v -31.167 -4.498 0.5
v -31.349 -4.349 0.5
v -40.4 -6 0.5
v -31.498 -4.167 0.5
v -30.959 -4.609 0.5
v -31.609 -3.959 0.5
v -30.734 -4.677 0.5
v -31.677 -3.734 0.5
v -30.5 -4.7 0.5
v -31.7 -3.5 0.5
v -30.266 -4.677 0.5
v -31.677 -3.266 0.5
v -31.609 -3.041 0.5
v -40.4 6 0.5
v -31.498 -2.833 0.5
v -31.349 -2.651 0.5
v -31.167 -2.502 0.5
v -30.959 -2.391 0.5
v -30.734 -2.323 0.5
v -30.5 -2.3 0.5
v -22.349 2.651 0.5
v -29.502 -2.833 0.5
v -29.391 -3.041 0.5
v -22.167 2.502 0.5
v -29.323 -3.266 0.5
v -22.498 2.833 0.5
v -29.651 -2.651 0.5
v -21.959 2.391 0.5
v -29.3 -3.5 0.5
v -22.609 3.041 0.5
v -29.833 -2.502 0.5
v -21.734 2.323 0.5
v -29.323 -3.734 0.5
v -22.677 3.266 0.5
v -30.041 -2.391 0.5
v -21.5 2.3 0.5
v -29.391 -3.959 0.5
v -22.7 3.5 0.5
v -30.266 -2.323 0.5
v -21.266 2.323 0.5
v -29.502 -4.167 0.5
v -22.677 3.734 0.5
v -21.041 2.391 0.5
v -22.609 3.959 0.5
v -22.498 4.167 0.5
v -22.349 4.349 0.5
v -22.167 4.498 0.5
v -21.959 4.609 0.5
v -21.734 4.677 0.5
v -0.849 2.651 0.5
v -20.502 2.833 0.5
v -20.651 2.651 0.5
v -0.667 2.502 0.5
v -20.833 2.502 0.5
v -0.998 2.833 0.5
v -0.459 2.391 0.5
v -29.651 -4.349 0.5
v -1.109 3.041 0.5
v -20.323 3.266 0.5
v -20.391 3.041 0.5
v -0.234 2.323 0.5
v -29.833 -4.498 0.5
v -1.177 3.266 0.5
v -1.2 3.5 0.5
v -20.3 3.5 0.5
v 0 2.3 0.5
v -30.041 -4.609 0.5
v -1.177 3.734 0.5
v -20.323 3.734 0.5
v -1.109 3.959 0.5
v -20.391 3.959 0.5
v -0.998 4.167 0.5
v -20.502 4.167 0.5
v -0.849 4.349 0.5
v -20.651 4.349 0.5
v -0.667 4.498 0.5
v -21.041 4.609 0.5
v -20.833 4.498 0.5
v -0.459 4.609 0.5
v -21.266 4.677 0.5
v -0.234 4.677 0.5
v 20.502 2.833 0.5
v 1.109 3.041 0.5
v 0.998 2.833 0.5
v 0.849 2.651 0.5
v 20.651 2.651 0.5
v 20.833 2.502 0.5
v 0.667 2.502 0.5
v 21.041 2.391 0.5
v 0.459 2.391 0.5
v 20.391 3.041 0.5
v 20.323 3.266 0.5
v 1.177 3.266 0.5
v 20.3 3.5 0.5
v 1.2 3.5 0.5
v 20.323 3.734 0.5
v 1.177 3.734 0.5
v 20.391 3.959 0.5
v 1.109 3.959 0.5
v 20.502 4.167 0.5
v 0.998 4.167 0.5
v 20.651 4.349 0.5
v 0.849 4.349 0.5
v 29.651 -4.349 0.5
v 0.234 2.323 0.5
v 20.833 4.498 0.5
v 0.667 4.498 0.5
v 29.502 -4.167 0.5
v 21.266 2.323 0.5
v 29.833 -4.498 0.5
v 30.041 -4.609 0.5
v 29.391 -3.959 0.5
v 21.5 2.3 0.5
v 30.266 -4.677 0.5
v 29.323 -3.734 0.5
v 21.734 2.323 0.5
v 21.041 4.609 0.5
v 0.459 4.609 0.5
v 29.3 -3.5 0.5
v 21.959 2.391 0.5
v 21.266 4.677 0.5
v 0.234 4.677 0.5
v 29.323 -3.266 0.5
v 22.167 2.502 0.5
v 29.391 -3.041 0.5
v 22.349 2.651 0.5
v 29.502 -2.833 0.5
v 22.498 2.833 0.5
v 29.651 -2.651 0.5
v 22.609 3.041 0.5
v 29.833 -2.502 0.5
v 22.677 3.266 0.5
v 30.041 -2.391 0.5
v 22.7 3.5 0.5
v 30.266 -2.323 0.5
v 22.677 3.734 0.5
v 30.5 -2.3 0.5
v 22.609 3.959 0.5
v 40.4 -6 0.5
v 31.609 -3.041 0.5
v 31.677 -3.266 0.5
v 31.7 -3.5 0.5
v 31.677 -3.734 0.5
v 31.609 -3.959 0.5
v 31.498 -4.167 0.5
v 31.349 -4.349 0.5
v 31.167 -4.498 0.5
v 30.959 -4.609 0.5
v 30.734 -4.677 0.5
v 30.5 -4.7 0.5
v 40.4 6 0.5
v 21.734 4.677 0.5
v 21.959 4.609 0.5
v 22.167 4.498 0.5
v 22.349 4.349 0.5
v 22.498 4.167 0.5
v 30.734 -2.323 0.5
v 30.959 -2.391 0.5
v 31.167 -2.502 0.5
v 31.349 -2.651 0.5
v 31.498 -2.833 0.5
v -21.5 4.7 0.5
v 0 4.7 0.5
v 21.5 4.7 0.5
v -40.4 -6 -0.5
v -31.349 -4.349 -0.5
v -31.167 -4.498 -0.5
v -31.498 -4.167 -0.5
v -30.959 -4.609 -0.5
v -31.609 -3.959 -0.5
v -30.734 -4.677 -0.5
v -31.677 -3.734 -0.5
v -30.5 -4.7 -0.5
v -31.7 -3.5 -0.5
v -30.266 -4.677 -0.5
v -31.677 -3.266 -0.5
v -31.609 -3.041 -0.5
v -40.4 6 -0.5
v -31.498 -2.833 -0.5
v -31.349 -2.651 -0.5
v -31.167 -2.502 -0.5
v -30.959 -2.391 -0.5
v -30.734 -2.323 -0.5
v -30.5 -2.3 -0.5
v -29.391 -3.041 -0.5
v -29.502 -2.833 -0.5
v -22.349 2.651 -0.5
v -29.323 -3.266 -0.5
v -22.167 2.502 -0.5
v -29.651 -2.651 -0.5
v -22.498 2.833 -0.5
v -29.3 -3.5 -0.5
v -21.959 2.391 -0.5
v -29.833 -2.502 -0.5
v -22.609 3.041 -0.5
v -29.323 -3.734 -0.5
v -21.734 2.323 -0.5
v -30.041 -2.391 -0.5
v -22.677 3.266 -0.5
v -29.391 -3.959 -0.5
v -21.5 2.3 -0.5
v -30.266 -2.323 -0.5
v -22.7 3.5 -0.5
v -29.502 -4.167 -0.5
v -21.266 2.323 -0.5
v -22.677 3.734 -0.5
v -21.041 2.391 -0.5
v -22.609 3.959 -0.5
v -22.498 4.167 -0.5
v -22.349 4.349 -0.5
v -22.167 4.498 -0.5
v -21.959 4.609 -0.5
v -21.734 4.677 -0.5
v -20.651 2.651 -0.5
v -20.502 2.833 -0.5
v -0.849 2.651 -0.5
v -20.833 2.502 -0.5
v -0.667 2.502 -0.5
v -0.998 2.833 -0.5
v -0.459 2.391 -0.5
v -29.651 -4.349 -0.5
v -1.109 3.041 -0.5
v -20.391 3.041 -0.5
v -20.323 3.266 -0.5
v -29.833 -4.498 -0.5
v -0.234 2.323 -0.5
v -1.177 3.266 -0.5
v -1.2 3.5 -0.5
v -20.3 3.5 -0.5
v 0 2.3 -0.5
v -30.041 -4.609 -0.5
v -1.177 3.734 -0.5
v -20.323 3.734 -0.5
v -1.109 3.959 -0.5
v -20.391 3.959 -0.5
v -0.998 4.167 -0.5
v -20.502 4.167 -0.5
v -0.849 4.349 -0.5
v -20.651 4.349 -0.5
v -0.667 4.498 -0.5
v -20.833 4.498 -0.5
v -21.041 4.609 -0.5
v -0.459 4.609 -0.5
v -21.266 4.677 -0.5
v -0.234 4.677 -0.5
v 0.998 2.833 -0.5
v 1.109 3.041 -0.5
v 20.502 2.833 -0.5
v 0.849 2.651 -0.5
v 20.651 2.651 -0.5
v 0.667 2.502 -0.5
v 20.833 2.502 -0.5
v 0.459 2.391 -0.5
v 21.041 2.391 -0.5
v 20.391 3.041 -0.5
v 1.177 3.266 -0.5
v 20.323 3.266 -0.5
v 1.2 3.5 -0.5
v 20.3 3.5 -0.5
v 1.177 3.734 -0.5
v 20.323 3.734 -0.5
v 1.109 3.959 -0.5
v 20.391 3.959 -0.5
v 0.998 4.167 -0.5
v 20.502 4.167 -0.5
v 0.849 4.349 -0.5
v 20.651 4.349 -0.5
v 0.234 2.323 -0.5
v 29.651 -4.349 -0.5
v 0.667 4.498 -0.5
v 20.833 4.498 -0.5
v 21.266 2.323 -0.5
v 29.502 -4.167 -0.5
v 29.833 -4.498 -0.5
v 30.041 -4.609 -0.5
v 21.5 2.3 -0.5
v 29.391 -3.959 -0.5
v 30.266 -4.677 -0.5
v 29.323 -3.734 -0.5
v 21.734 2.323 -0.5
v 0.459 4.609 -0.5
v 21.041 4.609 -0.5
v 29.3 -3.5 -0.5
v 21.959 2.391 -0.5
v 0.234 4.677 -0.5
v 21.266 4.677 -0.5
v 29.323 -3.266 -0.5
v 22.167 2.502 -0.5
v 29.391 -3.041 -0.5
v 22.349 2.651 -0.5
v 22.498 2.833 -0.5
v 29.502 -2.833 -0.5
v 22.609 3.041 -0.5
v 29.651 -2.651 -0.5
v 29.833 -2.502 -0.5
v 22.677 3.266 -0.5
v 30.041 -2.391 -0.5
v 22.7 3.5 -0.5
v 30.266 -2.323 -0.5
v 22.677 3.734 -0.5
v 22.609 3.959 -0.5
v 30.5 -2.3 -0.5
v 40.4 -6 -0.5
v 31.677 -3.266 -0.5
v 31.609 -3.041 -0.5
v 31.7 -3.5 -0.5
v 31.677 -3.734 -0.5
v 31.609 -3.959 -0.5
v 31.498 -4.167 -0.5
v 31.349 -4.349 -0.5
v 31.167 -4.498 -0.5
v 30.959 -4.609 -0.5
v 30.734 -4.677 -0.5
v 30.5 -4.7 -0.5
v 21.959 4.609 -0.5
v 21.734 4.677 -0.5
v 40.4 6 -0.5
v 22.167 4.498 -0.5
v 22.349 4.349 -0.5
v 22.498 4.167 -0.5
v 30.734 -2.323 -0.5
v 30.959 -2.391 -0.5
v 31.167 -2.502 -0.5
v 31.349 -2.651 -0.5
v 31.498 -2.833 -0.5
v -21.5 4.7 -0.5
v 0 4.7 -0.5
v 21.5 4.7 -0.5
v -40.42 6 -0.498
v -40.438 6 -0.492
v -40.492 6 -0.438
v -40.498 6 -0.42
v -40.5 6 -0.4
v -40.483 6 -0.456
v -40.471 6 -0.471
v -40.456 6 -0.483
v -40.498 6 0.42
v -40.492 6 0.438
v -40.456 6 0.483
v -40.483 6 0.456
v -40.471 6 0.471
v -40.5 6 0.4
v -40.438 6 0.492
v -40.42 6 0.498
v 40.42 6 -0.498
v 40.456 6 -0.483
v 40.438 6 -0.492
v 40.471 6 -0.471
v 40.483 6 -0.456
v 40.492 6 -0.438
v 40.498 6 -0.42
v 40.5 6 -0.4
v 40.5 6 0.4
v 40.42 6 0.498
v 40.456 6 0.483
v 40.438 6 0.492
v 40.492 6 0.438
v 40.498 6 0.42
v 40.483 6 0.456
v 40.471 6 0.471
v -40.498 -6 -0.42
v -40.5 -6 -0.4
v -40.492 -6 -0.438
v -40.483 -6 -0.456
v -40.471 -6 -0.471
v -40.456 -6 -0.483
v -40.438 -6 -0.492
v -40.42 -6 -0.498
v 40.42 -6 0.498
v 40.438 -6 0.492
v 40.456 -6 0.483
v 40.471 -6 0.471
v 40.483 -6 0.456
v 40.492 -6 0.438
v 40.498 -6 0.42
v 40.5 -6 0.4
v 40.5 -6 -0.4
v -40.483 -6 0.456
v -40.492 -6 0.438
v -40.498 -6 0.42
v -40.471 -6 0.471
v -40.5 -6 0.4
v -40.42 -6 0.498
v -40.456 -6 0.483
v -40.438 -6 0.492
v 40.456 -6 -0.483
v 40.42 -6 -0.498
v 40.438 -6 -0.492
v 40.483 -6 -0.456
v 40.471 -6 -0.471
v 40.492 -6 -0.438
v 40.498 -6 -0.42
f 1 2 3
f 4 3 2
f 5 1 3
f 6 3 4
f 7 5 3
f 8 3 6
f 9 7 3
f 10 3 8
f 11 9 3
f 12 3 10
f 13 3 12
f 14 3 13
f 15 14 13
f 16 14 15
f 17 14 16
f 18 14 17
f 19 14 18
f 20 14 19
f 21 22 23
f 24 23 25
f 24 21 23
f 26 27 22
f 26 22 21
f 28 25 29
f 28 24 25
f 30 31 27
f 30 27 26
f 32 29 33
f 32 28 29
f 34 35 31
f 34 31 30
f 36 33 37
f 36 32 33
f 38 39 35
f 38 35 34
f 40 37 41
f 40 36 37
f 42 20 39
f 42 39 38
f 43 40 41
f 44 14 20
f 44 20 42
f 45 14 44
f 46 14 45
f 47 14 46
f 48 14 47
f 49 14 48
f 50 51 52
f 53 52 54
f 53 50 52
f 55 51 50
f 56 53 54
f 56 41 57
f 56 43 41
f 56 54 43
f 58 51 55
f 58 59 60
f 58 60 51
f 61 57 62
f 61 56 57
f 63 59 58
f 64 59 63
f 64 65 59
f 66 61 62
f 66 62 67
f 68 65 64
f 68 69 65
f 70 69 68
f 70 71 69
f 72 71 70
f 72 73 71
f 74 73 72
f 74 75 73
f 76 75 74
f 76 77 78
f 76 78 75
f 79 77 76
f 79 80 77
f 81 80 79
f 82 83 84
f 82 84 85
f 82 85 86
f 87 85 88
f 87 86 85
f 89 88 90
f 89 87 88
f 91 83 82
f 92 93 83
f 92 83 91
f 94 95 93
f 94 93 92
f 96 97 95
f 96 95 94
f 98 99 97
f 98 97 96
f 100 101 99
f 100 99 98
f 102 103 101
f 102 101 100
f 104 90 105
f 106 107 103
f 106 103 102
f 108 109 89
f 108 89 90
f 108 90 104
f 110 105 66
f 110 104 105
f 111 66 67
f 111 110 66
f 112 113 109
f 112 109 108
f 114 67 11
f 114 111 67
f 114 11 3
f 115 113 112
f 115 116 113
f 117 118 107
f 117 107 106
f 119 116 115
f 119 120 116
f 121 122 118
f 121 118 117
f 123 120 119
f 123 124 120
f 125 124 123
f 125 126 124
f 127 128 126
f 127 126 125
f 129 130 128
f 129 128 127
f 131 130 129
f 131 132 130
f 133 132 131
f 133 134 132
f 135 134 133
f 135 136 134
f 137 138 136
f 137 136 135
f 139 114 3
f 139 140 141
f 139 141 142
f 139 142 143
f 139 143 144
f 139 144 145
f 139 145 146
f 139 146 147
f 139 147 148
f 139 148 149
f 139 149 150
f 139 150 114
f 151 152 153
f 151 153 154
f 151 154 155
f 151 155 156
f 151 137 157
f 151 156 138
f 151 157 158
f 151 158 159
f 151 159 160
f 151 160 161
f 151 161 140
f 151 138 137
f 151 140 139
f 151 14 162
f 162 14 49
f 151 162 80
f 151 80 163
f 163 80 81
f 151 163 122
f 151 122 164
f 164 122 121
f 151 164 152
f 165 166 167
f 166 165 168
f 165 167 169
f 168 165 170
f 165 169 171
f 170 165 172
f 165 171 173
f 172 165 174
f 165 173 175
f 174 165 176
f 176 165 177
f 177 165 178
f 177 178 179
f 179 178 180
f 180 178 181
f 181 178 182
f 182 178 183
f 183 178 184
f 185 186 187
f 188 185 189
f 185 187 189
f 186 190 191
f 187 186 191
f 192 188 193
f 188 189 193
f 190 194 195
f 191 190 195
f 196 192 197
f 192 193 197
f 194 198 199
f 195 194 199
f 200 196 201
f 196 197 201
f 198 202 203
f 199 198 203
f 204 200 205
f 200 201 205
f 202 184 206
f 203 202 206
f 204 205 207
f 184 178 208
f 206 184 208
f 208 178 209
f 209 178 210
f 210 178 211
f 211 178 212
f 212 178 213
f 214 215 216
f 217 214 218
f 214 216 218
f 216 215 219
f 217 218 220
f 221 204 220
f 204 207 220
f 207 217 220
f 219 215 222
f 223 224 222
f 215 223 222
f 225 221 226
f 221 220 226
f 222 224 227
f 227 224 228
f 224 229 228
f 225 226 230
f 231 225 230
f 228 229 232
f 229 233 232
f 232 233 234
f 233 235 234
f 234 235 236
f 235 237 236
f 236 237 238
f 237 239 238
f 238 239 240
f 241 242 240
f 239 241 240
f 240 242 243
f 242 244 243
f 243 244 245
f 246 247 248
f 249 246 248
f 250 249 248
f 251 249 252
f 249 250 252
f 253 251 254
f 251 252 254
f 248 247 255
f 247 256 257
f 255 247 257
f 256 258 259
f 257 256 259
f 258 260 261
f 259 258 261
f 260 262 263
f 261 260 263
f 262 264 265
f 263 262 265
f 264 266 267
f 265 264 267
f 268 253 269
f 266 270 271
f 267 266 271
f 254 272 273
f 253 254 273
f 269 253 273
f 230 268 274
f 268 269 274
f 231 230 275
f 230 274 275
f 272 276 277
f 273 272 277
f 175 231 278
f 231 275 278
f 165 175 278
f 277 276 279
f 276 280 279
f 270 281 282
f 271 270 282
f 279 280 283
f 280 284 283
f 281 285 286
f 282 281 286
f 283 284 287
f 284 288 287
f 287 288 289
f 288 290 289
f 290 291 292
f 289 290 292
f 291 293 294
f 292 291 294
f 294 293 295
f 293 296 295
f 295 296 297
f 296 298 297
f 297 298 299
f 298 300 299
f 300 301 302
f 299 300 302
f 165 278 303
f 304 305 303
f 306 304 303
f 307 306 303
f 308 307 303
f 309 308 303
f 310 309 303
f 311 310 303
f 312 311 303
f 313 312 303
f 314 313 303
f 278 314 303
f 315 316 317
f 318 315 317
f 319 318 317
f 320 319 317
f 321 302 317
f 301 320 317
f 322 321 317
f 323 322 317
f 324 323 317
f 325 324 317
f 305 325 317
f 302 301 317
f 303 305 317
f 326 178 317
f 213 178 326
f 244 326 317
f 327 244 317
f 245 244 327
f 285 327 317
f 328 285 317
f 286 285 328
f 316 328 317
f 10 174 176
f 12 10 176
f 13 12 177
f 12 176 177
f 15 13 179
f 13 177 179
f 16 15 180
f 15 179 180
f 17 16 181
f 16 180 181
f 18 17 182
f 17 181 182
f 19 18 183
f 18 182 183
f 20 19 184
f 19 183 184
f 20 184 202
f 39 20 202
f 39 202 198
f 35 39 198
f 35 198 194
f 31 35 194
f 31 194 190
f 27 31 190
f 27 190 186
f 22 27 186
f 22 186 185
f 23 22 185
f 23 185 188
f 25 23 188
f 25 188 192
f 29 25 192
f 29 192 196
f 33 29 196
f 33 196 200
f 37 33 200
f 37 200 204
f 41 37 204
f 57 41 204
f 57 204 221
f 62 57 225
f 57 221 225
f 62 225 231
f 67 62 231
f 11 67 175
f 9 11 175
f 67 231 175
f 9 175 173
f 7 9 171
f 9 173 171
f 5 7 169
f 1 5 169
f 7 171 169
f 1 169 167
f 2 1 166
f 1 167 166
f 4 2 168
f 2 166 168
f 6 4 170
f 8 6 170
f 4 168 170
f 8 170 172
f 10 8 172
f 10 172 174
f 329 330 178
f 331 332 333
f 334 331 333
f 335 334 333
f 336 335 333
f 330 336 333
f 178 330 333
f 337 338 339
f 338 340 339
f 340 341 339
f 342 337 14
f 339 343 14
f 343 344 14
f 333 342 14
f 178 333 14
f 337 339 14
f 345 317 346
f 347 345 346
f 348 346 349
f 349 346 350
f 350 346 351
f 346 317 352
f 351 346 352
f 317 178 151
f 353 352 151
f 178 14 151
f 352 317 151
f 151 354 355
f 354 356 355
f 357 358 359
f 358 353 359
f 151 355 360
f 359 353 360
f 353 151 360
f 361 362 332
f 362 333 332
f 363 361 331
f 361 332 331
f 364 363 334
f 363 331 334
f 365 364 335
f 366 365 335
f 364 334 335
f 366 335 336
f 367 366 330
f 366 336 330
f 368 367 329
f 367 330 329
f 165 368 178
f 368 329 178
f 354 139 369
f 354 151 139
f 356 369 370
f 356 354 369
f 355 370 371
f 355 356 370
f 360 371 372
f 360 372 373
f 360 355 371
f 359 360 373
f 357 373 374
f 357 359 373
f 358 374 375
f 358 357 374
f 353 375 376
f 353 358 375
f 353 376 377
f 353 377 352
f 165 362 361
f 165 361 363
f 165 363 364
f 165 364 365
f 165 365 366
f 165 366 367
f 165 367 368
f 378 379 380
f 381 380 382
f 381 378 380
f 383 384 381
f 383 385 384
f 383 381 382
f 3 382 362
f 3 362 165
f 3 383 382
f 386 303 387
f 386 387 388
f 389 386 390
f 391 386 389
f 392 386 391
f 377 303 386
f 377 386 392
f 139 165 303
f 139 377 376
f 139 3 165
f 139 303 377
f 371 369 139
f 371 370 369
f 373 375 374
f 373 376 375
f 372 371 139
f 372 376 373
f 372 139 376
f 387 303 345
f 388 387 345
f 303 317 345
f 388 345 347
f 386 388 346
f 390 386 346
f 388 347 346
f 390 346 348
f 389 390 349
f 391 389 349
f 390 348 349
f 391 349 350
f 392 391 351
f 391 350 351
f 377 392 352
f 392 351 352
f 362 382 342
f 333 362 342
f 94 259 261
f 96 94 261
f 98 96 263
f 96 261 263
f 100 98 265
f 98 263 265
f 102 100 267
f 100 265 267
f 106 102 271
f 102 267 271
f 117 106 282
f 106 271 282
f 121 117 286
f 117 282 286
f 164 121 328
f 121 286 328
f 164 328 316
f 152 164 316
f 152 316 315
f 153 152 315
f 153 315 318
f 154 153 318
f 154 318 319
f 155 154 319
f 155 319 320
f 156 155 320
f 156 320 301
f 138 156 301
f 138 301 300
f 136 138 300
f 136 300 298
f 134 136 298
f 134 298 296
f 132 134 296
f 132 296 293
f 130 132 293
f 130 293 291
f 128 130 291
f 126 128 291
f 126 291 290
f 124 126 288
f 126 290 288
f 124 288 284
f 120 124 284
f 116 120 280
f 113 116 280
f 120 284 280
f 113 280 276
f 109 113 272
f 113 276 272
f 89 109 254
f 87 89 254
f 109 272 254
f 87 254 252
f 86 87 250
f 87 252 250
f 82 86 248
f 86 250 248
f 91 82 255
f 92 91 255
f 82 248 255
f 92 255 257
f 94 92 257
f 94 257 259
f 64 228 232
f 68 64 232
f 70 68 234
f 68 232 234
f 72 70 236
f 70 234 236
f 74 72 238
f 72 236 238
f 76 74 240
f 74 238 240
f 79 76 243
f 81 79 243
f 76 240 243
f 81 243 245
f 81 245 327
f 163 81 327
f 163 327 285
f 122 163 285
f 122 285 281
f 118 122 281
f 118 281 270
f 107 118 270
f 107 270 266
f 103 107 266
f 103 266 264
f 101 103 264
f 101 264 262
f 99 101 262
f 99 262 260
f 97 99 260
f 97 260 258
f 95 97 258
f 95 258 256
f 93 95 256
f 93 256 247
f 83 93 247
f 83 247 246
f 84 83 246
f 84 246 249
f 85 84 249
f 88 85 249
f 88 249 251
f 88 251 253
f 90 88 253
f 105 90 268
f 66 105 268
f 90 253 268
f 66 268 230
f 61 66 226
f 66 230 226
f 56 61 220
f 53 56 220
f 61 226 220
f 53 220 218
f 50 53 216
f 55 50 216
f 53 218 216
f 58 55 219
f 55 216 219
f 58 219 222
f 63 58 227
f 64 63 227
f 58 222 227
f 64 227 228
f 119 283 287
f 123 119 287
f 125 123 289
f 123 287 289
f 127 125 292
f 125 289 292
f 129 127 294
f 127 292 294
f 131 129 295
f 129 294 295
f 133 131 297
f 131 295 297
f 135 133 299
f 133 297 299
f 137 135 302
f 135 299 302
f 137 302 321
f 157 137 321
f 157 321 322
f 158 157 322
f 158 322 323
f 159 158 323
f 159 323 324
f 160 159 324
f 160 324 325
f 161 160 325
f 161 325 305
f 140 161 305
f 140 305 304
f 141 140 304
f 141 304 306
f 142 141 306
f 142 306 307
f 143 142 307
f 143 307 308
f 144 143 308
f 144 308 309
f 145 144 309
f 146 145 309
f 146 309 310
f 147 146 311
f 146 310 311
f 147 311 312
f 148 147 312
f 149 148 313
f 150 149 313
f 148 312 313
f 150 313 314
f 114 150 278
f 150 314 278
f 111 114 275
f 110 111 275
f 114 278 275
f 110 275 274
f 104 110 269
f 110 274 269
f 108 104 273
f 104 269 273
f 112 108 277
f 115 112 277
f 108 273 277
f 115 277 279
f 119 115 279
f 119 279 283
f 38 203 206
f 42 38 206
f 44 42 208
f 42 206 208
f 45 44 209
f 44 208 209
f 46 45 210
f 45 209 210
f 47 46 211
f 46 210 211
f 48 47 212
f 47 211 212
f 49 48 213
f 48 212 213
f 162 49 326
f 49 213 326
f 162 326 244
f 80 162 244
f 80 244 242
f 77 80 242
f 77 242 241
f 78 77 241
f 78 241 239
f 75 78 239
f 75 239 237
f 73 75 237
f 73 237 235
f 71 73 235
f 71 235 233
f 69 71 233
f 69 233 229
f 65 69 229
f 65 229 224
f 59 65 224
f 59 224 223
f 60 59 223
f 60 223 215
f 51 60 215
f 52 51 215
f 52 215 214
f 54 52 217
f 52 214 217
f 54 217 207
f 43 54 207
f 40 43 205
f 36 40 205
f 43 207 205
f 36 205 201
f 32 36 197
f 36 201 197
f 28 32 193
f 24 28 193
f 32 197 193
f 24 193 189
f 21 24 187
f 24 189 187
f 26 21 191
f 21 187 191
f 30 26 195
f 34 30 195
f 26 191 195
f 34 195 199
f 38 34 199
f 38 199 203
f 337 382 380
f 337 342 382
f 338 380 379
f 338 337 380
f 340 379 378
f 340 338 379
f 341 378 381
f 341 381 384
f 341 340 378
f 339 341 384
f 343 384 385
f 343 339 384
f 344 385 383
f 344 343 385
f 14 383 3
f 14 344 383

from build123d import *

# Parameters (mm, degrees)
SKETCH1_W           = 81
SKETCH1_H           = 12
BOSS_EXTRUDE1_DEPTH = 0.5
M2_HOLE1_AD_D       = 2.4
M2_HOLE1_AD_DEPTH   = 100
M2_HOLE1_AD_TIP     = 0.721032743
M2_HOLE2_AD_D       = 2.4
M2_HOLE2_AD_DEPTH   = 100
M2_HOLE2_AD_TIP     = 0.721032743
M2_HOLE3_AE_D       = 2.4
M2_HOLE3_AE_DEPTH   = 200
M2_HOLE3_AE_TIP     = 0.721032743
FILLET1_R           = 0.1


with BuildPart() as part:
    # Sketch1 → Boss-Extrude1 (new, symmetric)
    with BuildSketch(Plane.XY):
        Rectangle(SKETCH1_W, SKETCH1_H)
    extrude(amount=BOSS_EXTRUDE1_DEPTH, both=True)

    # M2 Hole1 - AD
    with Locations(Plane.XY.offset(0.5)):
        with Locations((-30.5, -3.5), (30.5, -3.5)):
            Hole(M2_HOLE1_AD_D / 2, depth=M2_HOLE1_AD_DEPTH)
            with Locations((0, 0, -(M2_HOLE1_AD_DEPTH + M2_HOLE1_AD_TIP / 2))):  # 118° drill point
                Cone(0, M2_HOLE1_AD_D / 2, M2_HOLE1_AD_TIP, mode=Mode.SUBTRACT)

    # M2 Hole2 - AD
    with Locations(Plane.XY.offset(0.5)):
        with Locations((-21.5, 3.5), (21.5, 3.5)):
            Hole(M2_HOLE2_AD_D / 2, depth=M2_HOLE2_AD_DEPTH)
            with Locations((0, 0, -(M2_HOLE2_AD_DEPTH + M2_HOLE2_AD_TIP / 2))):  # 118° drill point
                Cone(0, M2_HOLE2_AD_D / 2, M2_HOLE2_AD_TIP, mode=Mode.SUBTRACT)

    # M2 Hole3 - AE
    with Locations(Plane.XY.offset(0.5)):
        with Locations((0, 3.5)):
            Hole(M2_HOLE3_AE_D / 2, depth=M2_HOLE3_AE_DEPTH)
            with Locations((0, 0, -(M2_HOLE3_AE_DEPTH + M2_HOLE3_AE_TIP / 2))):  # 118° drill point
                Cone(0, M2_HOLE3_AE_D / 2, M2_HOLE3_AE_TIP, mode=Mode.SUBTRACT)

    # Fillet1
    fillet1_edges = [part.edges().sort_by_distance(p)[0] for p in [
        (-40.5, 0, 0.5),
        (40.5, 0, 0.5),
        (-40.5, 0, -0.5),
        (40.5, 0, -0.5),
    ]]
    fillet(fillet1_edges, radius=FILLET1_R)


solid = part.part
